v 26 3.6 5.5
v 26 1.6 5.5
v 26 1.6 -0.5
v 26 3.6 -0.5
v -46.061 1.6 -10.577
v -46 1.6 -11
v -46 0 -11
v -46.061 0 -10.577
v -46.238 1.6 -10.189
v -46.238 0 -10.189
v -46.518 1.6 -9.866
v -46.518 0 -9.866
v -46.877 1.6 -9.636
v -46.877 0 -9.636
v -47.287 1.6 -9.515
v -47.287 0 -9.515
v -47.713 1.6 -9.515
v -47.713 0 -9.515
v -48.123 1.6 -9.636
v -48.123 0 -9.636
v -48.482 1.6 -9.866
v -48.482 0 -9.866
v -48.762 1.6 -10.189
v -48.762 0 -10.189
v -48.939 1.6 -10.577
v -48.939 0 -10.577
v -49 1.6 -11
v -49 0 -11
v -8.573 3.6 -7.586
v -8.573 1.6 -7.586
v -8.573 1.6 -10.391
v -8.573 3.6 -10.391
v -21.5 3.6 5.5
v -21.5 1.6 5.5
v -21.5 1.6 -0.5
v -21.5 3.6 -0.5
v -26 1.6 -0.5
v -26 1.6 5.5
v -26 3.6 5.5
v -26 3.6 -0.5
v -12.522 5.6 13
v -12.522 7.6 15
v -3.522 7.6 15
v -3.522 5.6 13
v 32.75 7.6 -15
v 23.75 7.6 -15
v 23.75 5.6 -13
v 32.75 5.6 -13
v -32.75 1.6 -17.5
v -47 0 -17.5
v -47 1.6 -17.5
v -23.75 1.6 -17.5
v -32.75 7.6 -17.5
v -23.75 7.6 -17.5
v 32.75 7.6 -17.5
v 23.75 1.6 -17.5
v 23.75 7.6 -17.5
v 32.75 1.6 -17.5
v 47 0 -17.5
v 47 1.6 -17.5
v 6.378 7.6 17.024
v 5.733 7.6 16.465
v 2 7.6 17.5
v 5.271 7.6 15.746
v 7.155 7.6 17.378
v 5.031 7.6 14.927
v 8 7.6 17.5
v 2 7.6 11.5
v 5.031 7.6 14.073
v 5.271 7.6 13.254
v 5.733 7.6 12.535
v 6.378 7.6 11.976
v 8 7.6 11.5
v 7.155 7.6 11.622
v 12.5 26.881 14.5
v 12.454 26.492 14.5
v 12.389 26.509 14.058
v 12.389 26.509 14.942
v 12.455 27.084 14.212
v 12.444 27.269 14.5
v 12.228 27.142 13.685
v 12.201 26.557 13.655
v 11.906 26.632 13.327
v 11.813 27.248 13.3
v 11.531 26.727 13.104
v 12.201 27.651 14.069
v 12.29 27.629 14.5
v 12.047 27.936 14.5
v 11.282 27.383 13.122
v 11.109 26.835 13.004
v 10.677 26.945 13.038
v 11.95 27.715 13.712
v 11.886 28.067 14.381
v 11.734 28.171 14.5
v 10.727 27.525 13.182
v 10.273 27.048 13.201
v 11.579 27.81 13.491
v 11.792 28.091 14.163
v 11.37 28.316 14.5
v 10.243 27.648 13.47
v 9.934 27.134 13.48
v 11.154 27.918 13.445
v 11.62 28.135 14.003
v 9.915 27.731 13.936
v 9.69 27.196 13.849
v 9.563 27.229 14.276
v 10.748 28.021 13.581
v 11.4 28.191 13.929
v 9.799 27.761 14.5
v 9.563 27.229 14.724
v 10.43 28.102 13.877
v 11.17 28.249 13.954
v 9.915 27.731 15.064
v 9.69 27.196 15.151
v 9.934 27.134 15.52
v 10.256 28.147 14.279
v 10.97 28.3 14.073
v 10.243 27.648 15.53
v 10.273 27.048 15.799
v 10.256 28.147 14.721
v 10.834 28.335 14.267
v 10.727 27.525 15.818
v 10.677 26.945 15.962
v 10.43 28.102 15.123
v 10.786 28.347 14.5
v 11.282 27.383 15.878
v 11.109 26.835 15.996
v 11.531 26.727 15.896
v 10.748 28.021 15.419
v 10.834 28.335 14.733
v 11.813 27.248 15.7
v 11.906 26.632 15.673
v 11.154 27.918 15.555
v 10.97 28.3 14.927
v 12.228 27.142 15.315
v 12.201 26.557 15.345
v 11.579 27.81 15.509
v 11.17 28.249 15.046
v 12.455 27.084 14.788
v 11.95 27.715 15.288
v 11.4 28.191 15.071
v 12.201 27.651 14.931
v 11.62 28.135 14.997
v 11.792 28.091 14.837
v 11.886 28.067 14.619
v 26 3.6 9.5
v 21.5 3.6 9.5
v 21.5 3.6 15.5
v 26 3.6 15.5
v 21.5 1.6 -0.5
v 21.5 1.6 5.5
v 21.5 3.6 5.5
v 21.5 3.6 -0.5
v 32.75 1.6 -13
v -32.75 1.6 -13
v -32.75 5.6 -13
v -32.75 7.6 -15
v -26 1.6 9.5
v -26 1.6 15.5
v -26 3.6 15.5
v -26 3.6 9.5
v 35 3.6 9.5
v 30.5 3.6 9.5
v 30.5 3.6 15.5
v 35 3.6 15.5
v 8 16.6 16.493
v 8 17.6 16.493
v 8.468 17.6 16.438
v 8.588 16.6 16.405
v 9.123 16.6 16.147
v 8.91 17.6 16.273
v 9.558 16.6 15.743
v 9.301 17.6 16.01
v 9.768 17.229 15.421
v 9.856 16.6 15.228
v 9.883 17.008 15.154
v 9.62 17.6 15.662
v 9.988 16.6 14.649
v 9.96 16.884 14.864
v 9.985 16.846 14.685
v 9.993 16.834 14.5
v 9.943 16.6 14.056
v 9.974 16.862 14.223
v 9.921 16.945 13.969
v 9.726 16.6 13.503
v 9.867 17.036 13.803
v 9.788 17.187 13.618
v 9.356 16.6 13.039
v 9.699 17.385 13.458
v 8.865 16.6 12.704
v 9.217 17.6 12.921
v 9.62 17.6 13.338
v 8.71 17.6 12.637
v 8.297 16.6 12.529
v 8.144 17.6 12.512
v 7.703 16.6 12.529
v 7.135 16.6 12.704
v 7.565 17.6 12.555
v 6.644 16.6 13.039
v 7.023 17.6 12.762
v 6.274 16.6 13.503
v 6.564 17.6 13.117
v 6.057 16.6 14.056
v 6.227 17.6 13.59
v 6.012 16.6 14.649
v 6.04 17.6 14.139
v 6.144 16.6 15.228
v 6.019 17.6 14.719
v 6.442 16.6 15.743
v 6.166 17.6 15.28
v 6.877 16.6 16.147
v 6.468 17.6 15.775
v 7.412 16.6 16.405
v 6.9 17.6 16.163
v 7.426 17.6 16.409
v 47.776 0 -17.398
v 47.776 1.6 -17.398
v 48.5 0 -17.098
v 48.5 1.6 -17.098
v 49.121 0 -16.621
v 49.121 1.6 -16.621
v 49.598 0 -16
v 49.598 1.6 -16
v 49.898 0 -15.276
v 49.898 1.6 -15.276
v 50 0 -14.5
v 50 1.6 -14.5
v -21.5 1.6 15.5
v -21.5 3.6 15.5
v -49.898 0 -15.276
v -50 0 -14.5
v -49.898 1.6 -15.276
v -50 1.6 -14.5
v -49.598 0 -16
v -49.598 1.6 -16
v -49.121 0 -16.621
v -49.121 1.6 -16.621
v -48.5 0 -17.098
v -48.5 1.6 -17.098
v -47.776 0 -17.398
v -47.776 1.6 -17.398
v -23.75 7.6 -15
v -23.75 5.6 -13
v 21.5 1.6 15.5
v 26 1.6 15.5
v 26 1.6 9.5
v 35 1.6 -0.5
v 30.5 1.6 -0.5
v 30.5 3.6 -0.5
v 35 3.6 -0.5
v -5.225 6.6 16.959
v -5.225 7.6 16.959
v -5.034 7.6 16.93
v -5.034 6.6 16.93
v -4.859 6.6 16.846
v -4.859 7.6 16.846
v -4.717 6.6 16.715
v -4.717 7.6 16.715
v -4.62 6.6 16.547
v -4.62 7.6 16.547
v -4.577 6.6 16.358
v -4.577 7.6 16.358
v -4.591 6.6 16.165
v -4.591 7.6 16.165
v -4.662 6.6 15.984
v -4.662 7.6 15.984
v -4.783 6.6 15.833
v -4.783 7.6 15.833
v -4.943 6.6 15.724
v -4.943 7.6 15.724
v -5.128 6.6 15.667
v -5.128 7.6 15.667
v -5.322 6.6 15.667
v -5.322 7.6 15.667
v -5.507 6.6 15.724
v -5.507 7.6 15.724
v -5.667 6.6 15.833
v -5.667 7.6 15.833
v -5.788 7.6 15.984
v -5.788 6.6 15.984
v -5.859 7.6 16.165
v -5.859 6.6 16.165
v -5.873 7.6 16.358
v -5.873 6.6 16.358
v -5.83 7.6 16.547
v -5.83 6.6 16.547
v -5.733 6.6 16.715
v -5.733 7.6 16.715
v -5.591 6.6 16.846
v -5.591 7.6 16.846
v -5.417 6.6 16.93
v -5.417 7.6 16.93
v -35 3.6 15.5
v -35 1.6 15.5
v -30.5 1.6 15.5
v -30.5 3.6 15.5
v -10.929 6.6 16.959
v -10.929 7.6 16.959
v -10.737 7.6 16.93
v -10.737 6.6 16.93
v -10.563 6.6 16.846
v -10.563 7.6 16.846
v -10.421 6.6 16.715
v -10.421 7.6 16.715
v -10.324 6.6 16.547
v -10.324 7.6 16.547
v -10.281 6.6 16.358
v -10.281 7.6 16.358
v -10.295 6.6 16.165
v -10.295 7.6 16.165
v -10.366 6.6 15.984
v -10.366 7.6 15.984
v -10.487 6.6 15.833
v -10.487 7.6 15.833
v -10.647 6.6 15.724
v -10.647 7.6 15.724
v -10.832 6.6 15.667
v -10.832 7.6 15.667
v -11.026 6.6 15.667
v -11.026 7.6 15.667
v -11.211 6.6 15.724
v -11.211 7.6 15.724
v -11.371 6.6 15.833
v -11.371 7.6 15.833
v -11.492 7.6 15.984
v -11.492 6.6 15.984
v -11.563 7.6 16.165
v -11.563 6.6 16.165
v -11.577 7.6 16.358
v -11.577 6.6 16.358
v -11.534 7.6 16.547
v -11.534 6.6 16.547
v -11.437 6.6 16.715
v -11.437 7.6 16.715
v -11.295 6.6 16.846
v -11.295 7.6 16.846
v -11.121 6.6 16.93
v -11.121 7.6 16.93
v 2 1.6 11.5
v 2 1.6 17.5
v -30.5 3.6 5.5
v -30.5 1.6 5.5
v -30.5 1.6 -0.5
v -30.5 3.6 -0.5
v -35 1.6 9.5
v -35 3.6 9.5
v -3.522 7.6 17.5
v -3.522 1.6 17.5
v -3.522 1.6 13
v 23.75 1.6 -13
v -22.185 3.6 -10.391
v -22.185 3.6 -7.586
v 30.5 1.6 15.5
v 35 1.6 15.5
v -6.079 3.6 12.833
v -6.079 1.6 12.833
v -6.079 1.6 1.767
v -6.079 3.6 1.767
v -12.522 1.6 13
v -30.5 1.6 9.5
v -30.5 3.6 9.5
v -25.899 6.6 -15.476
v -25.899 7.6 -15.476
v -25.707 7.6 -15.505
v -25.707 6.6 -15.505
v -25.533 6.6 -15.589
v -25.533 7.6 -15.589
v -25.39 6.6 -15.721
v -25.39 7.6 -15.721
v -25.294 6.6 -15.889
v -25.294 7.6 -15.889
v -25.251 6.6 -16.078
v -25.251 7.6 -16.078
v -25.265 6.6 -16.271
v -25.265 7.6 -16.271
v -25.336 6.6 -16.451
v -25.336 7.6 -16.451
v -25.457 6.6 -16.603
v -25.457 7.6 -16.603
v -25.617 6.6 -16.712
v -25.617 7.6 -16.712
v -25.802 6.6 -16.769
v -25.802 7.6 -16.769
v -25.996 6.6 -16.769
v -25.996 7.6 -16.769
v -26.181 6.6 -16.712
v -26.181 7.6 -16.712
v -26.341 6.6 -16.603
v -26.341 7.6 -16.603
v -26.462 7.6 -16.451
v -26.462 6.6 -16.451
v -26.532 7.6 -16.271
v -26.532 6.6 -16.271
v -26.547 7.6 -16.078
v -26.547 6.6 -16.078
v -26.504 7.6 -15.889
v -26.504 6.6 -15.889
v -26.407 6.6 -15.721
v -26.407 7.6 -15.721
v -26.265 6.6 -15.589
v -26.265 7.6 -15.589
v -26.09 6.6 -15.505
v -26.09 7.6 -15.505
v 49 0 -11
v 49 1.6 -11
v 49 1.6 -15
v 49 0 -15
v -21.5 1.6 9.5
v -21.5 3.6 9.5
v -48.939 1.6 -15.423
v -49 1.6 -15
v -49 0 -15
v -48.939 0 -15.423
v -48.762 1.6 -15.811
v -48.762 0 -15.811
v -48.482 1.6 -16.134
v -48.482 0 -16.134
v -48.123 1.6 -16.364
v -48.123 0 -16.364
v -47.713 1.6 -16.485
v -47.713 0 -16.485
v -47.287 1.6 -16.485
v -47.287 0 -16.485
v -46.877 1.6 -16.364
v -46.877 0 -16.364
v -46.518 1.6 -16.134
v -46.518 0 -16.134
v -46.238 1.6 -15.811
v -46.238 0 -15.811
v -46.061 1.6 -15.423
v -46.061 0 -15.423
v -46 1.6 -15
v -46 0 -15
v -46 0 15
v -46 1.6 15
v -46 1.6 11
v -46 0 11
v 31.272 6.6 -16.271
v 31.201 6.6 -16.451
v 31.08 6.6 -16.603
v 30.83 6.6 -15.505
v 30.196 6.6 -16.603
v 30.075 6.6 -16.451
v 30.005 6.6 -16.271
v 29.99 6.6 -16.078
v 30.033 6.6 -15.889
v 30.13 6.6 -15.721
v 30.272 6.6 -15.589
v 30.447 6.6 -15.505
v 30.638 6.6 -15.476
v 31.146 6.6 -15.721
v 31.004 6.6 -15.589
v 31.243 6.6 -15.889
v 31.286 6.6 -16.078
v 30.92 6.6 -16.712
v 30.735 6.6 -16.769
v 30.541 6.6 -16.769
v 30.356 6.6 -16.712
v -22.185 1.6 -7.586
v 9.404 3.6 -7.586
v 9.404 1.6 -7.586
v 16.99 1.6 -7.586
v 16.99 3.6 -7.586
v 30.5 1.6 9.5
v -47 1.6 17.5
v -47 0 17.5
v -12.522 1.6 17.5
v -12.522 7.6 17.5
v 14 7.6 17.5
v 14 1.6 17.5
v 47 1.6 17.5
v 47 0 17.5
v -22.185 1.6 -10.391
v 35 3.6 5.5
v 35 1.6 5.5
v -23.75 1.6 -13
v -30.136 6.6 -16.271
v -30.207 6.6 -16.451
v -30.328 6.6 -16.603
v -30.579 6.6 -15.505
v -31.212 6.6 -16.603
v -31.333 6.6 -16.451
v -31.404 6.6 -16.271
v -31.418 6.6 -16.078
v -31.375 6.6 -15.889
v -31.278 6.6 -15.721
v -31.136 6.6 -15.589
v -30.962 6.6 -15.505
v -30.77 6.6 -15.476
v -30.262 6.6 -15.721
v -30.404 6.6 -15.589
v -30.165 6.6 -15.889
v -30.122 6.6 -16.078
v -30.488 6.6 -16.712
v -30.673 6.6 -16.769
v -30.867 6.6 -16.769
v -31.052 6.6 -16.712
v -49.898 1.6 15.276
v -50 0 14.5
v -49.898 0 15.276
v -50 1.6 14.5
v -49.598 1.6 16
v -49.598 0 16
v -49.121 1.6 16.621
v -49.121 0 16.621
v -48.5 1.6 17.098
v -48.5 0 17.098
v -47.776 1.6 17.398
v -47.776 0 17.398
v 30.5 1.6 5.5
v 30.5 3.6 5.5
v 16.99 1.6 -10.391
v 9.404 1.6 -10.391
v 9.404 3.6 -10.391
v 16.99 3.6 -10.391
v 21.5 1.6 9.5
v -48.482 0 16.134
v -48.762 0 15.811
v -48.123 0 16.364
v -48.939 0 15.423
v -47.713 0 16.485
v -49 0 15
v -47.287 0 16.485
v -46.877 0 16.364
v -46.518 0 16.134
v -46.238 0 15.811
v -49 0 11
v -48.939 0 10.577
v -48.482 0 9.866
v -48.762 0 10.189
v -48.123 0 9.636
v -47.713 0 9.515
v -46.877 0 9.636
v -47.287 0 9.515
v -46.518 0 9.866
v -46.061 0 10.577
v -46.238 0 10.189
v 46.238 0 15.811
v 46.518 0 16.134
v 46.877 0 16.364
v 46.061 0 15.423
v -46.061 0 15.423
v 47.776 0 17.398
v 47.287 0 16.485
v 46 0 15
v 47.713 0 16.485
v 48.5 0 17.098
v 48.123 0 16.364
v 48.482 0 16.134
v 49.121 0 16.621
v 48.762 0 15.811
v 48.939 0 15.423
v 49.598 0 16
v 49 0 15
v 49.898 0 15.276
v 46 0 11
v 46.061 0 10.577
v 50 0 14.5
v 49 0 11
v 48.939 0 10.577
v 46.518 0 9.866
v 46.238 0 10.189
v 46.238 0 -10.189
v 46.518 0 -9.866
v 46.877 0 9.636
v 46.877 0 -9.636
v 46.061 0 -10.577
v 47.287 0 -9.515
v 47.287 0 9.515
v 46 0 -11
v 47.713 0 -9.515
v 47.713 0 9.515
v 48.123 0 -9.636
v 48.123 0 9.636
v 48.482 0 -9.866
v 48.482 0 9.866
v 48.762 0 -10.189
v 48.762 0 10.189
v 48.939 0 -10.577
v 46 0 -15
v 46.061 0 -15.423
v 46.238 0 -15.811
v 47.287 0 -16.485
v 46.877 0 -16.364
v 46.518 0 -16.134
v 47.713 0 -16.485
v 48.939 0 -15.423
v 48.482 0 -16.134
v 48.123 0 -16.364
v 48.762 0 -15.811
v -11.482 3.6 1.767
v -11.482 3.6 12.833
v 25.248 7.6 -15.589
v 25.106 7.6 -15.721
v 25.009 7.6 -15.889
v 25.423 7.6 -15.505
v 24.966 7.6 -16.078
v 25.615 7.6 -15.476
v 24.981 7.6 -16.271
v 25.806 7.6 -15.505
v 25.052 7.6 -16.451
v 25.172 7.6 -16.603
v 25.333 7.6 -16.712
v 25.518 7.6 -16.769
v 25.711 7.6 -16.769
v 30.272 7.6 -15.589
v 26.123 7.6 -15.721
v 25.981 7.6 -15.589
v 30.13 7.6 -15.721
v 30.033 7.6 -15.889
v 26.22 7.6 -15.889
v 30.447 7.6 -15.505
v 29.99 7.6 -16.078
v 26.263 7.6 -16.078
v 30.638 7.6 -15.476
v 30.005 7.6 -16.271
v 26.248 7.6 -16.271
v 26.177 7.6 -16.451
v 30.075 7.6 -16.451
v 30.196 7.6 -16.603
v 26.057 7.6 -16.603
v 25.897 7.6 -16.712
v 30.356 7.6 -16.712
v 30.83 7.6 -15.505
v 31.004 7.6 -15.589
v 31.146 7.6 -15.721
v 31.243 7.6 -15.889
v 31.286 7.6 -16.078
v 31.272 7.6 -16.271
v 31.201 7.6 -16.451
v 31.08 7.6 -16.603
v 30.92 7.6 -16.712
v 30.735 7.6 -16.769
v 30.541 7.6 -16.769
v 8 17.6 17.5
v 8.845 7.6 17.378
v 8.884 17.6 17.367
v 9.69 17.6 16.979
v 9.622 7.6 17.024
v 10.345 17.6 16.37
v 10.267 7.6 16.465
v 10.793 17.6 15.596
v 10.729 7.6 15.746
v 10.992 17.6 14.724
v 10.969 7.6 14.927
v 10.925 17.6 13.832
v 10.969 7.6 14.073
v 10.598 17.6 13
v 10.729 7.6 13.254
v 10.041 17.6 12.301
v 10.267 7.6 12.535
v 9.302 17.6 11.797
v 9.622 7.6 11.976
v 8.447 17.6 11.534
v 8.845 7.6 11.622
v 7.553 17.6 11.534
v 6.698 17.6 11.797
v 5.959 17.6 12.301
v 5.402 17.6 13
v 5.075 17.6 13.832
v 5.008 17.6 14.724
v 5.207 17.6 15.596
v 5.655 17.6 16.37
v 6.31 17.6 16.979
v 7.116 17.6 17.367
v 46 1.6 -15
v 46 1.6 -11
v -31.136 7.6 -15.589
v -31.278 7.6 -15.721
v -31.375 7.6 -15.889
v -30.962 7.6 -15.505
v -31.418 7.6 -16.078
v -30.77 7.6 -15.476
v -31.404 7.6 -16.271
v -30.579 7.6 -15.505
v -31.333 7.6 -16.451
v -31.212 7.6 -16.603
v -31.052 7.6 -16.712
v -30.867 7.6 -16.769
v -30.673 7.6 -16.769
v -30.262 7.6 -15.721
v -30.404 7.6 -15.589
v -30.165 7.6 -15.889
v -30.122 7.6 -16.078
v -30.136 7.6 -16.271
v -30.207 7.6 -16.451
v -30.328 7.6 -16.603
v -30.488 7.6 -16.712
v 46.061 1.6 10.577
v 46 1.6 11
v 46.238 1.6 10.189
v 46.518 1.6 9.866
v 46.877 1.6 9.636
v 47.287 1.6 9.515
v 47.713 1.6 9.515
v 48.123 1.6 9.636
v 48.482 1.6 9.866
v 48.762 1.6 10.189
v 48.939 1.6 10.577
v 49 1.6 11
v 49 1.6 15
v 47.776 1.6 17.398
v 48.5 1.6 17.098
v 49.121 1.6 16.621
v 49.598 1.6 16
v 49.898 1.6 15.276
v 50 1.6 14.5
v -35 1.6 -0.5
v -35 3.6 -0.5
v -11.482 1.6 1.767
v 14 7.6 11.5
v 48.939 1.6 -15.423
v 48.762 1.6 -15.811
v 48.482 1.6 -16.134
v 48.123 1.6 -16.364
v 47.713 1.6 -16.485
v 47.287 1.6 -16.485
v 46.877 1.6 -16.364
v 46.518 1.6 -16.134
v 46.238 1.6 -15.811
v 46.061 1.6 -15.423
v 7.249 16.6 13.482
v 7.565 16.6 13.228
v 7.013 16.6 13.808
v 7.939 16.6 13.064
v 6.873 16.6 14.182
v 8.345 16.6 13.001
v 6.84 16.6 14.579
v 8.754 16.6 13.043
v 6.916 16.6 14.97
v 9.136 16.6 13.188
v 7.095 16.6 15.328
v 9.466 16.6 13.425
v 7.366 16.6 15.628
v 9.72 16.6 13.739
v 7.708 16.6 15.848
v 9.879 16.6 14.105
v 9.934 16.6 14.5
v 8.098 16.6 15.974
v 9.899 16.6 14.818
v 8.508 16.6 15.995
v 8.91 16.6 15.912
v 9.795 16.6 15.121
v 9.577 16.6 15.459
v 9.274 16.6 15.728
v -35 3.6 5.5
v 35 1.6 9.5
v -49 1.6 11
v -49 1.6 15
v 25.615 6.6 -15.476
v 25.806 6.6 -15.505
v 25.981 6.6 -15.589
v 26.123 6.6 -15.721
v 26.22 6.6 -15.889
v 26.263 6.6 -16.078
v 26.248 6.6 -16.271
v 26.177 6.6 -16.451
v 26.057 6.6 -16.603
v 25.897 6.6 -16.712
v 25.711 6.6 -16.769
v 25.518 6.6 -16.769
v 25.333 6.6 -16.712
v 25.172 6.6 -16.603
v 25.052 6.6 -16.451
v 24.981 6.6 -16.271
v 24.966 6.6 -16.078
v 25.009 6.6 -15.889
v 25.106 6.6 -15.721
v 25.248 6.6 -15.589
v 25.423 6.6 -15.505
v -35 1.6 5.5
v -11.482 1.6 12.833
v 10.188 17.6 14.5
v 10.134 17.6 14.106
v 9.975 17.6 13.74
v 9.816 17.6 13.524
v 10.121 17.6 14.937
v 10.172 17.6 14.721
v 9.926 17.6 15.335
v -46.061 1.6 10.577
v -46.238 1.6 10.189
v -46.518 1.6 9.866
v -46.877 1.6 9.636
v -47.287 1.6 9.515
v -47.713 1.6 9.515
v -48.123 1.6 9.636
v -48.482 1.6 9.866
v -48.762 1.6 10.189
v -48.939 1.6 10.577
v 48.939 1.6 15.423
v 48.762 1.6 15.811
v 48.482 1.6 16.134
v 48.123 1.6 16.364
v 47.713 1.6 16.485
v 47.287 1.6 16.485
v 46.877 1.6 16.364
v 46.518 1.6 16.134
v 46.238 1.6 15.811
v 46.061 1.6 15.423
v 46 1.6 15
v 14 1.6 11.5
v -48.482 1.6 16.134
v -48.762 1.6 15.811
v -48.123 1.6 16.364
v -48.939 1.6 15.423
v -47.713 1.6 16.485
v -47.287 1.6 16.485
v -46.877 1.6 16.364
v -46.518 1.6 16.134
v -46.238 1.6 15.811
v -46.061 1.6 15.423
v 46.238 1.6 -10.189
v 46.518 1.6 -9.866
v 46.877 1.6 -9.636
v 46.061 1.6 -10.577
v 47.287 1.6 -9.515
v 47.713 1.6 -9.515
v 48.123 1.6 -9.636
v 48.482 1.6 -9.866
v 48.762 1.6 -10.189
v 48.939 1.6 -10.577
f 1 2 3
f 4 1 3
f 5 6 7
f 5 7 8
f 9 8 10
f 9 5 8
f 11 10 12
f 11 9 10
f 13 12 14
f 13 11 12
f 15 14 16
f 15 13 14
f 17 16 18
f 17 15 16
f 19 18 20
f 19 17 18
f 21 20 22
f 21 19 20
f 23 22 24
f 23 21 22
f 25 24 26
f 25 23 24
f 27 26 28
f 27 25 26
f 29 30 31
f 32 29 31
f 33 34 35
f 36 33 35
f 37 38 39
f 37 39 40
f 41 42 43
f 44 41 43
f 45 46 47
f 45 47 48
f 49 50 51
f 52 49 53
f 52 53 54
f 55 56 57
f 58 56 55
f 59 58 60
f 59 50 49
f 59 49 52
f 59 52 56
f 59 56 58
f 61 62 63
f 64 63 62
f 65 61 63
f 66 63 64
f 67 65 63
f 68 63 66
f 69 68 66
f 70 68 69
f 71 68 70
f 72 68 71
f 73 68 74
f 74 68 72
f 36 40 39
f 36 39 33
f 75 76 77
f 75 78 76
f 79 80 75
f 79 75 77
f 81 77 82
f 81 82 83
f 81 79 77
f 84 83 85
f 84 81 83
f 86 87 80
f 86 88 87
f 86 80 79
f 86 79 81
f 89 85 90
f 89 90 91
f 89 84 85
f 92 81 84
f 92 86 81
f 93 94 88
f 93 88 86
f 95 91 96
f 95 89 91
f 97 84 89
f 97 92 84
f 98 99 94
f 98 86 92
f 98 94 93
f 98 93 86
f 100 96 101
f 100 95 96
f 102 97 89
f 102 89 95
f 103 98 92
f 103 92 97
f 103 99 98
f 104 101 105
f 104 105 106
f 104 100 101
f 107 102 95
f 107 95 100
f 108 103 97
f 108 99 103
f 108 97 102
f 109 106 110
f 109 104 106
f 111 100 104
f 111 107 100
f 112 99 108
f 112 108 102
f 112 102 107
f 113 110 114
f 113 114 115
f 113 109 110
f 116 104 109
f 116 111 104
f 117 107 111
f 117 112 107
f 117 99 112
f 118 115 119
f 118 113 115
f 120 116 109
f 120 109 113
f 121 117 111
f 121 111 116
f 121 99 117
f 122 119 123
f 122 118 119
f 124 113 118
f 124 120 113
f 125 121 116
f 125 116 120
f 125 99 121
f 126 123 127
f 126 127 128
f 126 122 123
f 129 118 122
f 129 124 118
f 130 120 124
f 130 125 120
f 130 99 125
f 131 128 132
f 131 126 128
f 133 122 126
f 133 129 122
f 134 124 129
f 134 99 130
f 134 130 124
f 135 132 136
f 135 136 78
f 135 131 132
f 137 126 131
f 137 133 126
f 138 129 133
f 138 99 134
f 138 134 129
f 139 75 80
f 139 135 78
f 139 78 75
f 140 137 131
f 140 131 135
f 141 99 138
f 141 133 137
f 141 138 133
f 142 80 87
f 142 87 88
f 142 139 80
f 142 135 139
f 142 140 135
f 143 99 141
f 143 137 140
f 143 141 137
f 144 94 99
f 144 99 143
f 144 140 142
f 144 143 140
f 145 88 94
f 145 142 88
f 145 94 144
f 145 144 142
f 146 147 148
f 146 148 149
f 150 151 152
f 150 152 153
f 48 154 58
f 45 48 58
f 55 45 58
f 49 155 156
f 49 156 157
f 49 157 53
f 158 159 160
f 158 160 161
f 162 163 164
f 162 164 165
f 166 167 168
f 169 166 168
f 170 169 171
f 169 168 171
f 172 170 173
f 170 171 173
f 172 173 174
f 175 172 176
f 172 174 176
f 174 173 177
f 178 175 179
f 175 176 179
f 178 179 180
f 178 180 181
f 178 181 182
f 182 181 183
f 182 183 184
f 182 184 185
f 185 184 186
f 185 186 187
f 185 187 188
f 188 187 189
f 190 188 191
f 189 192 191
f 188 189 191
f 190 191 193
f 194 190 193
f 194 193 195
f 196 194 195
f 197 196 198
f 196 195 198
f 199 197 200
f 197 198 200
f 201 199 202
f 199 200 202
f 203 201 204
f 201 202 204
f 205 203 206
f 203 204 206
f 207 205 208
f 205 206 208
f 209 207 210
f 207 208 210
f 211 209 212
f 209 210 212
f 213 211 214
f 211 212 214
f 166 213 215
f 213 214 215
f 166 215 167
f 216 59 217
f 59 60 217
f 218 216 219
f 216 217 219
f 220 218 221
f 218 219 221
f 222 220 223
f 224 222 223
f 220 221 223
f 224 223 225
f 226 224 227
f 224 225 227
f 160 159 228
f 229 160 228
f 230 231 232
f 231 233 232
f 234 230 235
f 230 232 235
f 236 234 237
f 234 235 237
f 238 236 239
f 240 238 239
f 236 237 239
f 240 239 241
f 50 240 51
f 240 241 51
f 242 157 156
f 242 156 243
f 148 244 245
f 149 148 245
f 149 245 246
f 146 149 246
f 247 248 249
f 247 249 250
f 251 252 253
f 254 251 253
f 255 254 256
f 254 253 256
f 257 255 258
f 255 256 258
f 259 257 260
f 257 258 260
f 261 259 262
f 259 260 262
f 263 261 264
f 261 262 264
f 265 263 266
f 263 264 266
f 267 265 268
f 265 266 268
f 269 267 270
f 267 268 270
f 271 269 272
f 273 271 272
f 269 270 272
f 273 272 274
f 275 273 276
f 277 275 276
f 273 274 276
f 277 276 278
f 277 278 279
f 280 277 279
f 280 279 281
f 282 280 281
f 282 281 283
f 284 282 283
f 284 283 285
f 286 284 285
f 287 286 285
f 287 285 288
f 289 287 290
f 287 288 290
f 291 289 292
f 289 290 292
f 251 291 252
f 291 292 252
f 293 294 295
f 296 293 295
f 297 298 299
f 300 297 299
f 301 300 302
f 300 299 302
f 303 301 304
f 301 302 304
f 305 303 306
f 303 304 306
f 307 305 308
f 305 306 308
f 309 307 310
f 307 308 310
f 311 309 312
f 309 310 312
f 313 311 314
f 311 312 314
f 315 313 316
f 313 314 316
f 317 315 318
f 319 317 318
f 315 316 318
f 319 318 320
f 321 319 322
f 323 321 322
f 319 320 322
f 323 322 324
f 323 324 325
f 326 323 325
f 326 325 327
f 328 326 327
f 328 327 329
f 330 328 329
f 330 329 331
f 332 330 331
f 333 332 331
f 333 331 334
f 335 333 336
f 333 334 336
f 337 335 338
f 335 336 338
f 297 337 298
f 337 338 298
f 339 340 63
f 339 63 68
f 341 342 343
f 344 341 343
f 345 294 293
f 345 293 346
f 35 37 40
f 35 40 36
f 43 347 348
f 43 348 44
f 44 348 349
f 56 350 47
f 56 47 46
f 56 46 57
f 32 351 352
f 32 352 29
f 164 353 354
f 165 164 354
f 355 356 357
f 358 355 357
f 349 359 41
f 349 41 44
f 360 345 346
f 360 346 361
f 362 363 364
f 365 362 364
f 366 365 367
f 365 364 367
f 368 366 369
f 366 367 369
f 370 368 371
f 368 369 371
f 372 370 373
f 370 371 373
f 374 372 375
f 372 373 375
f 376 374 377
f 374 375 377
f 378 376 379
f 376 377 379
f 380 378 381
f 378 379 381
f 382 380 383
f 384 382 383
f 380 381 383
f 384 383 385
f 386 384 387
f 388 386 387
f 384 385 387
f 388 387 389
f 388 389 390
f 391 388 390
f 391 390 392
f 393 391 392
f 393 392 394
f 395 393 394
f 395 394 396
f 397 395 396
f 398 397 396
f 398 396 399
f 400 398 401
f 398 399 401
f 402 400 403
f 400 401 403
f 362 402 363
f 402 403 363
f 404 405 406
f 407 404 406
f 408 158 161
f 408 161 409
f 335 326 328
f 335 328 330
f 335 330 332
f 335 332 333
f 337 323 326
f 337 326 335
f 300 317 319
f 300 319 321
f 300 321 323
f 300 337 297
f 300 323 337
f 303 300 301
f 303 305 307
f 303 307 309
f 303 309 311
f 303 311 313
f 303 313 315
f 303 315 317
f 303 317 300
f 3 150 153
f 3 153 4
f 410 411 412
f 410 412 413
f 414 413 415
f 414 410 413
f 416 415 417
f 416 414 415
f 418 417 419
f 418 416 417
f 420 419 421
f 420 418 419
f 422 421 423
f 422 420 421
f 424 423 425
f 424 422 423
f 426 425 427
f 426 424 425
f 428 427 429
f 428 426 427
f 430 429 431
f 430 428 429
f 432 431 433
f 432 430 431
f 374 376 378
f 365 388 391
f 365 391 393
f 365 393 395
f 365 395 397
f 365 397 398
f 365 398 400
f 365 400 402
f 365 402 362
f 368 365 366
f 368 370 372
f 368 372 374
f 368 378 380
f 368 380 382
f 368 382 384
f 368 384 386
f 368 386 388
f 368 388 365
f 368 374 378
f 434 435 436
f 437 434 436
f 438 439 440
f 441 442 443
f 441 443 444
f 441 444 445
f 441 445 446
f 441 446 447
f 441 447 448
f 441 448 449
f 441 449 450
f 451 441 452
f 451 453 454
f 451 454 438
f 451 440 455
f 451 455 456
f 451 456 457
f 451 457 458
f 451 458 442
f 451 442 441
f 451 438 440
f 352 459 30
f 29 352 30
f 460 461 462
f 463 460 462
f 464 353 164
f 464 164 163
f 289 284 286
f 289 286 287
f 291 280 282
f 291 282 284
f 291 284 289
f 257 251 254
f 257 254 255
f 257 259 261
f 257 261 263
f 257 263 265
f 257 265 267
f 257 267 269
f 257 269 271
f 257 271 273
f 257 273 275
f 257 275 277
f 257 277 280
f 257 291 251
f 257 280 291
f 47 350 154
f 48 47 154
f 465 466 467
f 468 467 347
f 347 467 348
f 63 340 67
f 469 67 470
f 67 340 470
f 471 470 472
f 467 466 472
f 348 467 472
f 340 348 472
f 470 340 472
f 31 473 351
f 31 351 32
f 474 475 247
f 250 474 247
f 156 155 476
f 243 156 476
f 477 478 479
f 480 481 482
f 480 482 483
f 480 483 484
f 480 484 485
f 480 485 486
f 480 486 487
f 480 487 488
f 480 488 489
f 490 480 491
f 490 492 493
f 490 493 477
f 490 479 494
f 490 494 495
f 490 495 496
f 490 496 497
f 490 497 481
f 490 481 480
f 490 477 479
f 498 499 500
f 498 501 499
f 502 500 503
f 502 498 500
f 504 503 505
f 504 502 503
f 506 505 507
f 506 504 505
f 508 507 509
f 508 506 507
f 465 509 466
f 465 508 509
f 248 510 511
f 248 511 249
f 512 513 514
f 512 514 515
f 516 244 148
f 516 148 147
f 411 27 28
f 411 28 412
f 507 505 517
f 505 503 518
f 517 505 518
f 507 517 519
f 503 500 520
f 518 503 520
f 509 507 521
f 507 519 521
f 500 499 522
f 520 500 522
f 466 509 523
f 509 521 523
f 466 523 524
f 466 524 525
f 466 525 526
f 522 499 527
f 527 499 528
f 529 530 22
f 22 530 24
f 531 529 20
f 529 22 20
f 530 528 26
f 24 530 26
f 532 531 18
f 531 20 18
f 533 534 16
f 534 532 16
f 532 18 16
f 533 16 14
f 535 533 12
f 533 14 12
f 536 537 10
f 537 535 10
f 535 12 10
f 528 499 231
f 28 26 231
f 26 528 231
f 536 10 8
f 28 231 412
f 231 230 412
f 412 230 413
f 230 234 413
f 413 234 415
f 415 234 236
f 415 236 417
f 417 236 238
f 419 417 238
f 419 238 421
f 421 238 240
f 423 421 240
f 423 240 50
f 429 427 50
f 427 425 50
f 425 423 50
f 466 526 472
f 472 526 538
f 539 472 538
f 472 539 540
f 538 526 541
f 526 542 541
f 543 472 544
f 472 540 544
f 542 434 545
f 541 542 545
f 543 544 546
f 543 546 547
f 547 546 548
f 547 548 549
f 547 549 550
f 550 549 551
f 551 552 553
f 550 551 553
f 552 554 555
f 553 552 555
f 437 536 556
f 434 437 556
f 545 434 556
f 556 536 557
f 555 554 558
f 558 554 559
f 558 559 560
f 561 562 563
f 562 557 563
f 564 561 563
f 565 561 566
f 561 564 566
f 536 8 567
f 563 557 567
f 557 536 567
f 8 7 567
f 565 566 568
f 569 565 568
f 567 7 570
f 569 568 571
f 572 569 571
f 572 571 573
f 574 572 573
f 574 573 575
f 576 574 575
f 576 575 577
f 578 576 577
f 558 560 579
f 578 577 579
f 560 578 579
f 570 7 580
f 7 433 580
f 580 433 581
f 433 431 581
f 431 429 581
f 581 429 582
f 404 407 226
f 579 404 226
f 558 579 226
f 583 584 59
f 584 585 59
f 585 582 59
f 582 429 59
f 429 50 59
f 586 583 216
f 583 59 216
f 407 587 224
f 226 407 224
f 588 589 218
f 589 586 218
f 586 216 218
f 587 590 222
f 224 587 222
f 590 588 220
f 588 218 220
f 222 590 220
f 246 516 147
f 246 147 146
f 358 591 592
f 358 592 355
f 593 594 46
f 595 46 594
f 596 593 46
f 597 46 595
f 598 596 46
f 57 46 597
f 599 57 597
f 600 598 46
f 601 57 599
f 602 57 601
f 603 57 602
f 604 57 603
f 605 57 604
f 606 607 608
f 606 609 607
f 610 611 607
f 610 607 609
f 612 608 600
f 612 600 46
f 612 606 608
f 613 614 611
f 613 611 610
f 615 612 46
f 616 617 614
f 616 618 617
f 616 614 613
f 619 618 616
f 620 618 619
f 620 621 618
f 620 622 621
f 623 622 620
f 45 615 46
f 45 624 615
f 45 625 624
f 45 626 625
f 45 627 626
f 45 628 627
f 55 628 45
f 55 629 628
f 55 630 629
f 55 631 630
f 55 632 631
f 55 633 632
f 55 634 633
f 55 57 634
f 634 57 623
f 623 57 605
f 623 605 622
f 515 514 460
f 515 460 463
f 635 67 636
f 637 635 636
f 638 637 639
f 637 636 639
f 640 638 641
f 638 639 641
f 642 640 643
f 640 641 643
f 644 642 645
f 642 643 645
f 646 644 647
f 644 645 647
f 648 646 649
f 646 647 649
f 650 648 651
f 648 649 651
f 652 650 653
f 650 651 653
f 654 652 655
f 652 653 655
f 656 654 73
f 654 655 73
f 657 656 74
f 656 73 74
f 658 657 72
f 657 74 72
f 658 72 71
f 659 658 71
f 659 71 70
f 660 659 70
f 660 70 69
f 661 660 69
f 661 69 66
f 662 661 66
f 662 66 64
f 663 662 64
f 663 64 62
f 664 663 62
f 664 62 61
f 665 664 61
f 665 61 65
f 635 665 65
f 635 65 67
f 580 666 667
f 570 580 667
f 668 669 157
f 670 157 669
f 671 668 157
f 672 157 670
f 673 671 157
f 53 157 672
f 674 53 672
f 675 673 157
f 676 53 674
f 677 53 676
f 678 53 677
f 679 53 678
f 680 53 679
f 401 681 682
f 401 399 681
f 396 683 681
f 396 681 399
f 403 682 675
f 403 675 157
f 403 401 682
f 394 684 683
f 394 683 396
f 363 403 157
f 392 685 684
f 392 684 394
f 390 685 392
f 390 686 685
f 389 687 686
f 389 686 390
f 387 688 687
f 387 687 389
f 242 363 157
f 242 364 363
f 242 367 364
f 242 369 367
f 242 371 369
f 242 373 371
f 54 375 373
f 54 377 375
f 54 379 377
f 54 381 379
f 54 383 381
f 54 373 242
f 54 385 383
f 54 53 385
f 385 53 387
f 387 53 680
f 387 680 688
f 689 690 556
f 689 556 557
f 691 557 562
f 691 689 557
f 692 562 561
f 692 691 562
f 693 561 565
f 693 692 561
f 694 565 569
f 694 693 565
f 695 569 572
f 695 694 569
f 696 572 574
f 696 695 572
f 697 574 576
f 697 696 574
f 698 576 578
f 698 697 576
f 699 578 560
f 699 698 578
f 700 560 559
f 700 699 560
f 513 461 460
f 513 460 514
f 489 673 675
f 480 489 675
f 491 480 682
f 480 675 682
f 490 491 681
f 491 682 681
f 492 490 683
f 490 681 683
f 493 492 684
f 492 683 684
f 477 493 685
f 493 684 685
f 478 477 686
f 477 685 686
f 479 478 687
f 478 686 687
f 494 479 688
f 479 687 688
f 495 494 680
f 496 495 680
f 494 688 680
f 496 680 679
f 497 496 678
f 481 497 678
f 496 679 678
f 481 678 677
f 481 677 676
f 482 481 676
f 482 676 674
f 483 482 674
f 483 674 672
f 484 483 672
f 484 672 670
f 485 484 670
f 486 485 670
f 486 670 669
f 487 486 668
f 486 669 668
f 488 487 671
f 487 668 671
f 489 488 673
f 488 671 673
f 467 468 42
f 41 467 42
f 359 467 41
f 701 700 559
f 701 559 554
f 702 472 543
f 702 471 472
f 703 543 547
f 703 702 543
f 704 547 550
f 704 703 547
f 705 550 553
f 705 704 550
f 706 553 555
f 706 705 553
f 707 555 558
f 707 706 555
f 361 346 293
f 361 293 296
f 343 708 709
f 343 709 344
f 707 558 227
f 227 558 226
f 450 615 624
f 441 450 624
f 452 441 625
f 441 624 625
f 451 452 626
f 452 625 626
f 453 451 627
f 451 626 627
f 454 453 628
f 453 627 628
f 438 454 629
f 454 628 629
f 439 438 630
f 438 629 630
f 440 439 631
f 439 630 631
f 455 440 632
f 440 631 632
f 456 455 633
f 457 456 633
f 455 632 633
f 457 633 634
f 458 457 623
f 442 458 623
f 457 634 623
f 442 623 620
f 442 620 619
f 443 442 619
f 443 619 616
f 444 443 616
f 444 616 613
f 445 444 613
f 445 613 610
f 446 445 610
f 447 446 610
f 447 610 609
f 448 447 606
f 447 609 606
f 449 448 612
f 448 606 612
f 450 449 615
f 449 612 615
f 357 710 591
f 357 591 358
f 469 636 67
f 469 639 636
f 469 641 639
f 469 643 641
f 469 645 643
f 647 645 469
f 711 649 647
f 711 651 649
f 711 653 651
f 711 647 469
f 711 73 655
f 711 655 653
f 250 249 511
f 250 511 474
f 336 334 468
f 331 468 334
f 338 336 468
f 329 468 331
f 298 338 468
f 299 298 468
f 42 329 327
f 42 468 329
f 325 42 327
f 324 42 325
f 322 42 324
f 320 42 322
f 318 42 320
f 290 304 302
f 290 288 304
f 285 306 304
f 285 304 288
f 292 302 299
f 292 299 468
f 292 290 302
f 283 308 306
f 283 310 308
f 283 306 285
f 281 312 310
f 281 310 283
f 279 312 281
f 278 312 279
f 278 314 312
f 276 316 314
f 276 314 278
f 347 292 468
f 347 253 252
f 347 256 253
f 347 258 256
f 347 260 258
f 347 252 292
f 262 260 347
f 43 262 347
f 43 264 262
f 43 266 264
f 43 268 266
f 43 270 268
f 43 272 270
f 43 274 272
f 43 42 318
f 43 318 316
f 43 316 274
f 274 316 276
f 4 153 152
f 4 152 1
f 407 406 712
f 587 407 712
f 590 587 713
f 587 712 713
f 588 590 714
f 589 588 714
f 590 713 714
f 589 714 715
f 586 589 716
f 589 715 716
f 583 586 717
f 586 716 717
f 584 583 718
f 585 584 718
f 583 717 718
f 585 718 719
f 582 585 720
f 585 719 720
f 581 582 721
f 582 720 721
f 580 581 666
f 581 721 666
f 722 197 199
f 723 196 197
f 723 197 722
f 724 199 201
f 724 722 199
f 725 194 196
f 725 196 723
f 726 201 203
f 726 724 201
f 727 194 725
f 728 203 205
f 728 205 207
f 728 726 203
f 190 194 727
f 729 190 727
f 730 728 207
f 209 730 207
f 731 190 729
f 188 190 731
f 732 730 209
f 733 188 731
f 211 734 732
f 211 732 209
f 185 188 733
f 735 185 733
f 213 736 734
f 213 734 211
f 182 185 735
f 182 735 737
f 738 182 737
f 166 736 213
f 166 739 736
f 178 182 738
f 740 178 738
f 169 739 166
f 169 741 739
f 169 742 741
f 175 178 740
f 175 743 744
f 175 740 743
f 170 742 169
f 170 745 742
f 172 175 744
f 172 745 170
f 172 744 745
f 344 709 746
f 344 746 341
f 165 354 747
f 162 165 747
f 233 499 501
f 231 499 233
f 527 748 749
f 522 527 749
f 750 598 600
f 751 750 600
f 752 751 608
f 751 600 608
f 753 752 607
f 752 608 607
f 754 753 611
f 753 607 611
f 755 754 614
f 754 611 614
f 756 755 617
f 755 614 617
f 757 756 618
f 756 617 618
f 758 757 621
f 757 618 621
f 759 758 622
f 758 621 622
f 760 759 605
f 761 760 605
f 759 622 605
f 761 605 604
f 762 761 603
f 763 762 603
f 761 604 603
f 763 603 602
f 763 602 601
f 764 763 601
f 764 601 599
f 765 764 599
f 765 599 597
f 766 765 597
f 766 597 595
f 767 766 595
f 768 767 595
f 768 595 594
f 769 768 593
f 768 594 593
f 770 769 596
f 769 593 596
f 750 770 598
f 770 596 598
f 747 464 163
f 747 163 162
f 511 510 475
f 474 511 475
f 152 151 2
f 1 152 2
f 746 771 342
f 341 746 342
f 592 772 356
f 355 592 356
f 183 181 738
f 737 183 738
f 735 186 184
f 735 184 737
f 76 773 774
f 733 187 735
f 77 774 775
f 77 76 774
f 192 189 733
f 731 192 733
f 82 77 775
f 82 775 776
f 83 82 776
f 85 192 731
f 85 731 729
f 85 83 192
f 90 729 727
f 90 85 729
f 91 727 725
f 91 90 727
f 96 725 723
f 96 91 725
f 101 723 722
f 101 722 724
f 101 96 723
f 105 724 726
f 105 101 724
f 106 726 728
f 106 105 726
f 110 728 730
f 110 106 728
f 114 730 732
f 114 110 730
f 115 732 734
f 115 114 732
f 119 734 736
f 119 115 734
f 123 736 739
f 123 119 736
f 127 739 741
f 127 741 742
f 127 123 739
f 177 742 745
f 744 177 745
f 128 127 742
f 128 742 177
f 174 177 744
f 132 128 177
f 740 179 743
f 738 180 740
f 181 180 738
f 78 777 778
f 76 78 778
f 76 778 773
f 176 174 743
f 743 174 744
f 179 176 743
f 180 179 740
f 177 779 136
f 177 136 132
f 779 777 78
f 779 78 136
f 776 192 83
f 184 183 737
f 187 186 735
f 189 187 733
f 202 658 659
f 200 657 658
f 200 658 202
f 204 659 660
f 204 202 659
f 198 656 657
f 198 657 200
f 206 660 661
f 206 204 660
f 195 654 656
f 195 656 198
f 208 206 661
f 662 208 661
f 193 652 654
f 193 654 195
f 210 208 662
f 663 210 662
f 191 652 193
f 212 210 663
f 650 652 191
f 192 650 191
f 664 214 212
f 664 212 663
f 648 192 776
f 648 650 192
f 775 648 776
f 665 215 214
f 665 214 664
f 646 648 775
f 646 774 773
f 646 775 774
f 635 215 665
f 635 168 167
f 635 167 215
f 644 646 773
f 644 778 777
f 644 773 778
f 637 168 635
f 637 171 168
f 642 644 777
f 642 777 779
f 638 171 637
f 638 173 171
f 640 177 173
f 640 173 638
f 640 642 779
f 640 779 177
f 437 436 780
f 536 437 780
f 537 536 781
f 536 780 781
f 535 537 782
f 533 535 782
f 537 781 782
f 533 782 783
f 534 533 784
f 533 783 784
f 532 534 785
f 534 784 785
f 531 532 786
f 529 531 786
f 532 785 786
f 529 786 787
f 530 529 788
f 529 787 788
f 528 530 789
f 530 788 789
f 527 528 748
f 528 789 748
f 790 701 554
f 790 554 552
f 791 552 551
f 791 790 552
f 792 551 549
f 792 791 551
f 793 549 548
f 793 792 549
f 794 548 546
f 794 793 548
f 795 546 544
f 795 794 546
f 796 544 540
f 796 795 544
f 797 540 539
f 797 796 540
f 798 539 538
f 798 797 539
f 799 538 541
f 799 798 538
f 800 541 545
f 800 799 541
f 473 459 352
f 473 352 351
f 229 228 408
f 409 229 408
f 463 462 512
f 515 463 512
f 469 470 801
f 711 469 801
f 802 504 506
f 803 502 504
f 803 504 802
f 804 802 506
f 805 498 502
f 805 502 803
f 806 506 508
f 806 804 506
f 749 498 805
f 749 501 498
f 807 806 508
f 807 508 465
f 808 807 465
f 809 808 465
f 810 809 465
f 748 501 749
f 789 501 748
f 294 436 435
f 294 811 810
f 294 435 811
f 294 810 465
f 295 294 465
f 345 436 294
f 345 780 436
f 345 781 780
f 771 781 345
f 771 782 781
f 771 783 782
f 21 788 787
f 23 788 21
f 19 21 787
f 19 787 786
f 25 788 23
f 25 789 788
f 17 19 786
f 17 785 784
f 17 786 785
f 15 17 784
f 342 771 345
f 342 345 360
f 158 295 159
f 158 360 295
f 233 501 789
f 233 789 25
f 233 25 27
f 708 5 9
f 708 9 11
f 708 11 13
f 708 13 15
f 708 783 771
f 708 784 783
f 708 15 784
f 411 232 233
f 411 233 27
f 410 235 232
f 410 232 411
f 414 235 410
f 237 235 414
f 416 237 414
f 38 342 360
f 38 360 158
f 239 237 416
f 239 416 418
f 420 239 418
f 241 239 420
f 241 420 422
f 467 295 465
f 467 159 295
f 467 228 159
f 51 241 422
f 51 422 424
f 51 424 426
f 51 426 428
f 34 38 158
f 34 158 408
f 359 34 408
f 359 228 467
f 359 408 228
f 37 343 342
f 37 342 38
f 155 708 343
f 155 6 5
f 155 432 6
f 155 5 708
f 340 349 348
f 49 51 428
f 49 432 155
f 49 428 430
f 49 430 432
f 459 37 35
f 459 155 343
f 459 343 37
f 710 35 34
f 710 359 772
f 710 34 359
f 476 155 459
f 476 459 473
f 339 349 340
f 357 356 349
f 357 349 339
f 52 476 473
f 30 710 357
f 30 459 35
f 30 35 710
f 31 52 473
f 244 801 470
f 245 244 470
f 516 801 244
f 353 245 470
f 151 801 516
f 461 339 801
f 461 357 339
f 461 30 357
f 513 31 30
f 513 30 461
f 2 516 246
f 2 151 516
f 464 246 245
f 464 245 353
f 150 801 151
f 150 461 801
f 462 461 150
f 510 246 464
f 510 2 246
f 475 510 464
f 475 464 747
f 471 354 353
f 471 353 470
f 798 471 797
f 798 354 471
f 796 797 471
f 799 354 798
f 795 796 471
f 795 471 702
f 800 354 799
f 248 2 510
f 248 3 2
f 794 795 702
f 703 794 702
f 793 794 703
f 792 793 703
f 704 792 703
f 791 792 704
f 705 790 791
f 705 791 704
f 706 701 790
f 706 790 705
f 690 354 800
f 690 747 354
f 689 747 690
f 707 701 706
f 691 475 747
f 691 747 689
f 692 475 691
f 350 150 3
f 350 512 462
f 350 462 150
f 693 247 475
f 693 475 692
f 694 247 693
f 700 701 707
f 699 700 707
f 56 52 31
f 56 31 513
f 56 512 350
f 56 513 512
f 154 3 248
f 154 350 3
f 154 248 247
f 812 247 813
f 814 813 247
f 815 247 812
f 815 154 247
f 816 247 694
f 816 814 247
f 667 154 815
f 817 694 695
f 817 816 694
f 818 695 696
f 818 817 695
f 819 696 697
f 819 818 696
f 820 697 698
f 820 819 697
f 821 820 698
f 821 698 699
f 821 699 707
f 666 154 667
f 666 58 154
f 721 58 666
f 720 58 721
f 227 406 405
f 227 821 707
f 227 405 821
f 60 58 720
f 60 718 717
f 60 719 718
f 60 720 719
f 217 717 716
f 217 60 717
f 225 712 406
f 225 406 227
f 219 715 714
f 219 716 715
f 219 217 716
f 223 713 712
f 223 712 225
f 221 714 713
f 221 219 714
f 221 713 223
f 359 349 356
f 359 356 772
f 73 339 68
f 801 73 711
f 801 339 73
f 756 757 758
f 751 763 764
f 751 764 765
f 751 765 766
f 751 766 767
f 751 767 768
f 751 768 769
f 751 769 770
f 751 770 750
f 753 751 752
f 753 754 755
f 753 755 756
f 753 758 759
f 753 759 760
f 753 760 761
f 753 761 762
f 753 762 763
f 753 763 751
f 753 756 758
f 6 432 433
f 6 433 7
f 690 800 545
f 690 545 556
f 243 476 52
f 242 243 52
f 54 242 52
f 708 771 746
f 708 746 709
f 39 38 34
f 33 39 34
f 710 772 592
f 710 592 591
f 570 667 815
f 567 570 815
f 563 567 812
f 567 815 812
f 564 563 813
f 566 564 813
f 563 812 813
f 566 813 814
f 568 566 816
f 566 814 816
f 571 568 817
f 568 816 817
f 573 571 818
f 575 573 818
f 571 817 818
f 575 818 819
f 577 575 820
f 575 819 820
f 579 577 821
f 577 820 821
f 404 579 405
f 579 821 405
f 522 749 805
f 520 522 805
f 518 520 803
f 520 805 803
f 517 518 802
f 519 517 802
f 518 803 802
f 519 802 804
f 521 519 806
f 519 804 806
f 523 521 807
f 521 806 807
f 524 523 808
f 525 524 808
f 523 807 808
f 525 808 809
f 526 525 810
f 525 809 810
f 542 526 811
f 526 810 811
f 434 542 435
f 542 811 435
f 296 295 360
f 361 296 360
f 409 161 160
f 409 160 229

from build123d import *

# Parameters (mm, degrees)
SKETCH_1_W          = 100
SKETCH_1_H          = 35
EXTRUDE_1_DEPTH     = 1.6
CUT_EXTRUDE_1_DEPTH = 53.998207517
FILLET_1_R          = 3
SKETCH_3_W          = 12
SKETCH_3_H          = 6
EXTRUDE_2_DEPTH     = 6
SKETCH_4_R          = 3
EXTRUDE_3_DEPTH     = 10
SKETCH_5_W          = 4.5
SKETCH_5_H          = 6
SKETCH_5_W_2        = 5.403478788
SKETCH_5_H_2        = 11.06674021
EXTRUDE_4_DEPTH     = 2
SKETCH_6_W          = 7.585652914
SKETCH_6_H          = 2.805652448
SKETCH_6_W_2        = 13.612610022
EXTRUDE_5_DEPTH     = 2
SKETCH_7_W          = 9
SKETCH_7_H          = 4.5
EXTRUDE_6_DEPTH     = 6
CHAMFER_1_SIZE      = 2
SKETCH_9_R          = 0.65
CUT_EXTRUDE_2_DEPTH = 1
SWEEP_1_PROFILE_R   = 1.5
SKETCH_27_R         = 1.993301653
CUT_EXTRUDE_3_DEPTH = 1


with BuildPart() as part:
    # 草图1 → 凸台-拉伸1 (new body)
    with BuildSketch(Plane(origin=(0, 0, 0), x_dir=(1, 0, 0), z_dir=(0, 1, 0))):
        Rectangle(SKETCH_1_W, SKETCH_1_H)
    extrude(amount=EXTRUDE_1_DEPTH)

    # 草图2 → 切除-拉伸1 (cut, through all)
    with BuildSketch(Plane(origin=(0, 1.6, 0), x_dir=(1, 0, 0), z_dir=(0, 1, 0))):
        with BuildLine():
            Line((-49, 11), (-49, 15))
            ThreePointArc((-49, 15), (-47.5, 16.5), (-46, 15))
            Line((-46, 15), (-46, 11))
            ThreePointArc((-46, 11), (-47.5, 9.5), (-49, 11))
        make_face()
        with BuildLine():
            Line((49, 11), (49, 15))
            ThreePointArc((49, 15), (47.5, 16.5), (46, 15))
            Line((46, 15), (46, 11))
            ThreePointArc((46, 11), (47.5, 9.5), (49, 11))
        make_face()
        with BuildLine():
            Line((-49, -11), (-49, -15))
            ThreePointArc((-49, -15), (-47.5, -16.5), (-46, -15))
            Line((-46, -15), (-46, -11))
            ThreePointArc((-46, -11), (-47.5, -9.5), (-49, -11))
        make_face()
        with BuildLine():
            Line((49, -11), (49, -15))
            ThreePointArc((49, -15), (47.5, -16.5), (46, -15))
            Line((46, -15), (46, -11))
            ThreePointArc((46, -11), (47.5, -9.5), (49, -11))
        make_face()
    extrude(amount=-CUT_EXTRUDE_1_DEPTH, mode=Mode.SUBTRACT)

    # 圆角1
    fillet_1_edges = [part.edges().sort_by_distance(p)[0] for p in [
        (50, 0.8, 17.5),
        (-50, 0.8, 17.5),
        (-50, 0.8, -17.5),
        (50, 0.8, -17.5),
    ]]
    fillet(fillet_1_edges, radius=FILLET_1_R)

    # 草图3 → 凸台-拉伸2 (add)
    with BuildSketch(Plane(origin=(0, 1.6, 0), x_dir=(1, 0, 0), z_dir=(0, 1, 0))):
        with Locations((8, -14.5)):
            Rectangle(SKETCH_3_W, SKETCH_3_H)
    extrude(amount=EXTRUDE_2_DEPTH)

    # 草图4 → 凸台-拉伸3 (add)
    with BuildSketch(Plane(origin=(0, 7.6, 0), x_dir=(1, 0, 0), z_dir=(0, 1, 0))):
        with Locations(Location((8, -14.5, 0), (0, 0, 270))):
            Circle(SKETCH_4_R)
    extrude(amount=EXTRUDE_3_DEPTH)

    # 草图5 → 凸台-拉伸4 (add)
    with BuildSketch(Plane(origin=(0, 1.6, 0), x_dir=(1, 0, 0), z_dir=(0, 1, 0))):
        with Locations((-32.75, -2.5)):
            Rectangle(SKETCH_5_W, SKETCH_5_H)
        with Locations((-23.75, -2.5)):
            Rectangle(SKETCH_5_W, SKETCH_5_H)
        with Locations((-32.75, -12.5)):
            Rectangle(SKETCH_5_W, SKETCH_5_H)
        with Locations((-23.75, -12.5)):
            Rectangle(SKETCH_5_W, SKETCH_5_H)
        with Locations((-8.78065303, -7.299892016)):
            Rectangle(SKETCH_5_W_2, SKETCH_5_H_2)
        with Locations((23.75, -12.5)):
            Rectangle(SKETCH_5_W, SKETCH_5_H)
        with Locations((32.75, -12.5)):
            Rectangle(SKETCH_5_W, SKETCH_5_H)
        with Locations((32.75, -2.5)):
            Rectangle(SKETCH_5_W, SKETCH_5_H)
        with Locations((23.75, -2.5)):
            Rectangle(SKETCH_5_W, SKETCH_5_H)
    extrude(amount=EXTRUDE_4_DEPTH)

    # 草图6 → 凸台-拉伸5 (add)
    with BuildSketch(Plane(origin=(0, 1.6, 0), x_dir=(1, 0, 0), z_dir=(0, 1, 0))):
        with Locations((13.196957808, 8.988479137)):
            Rectangle(SKETCH_6_W, SKETCH_6_H)
        with Locations((-15.379131934, 8.988479137)):
            Rectangle(SKETCH_6_W_2, SKETCH_6_H)
    extrude(amount=EXTRUDE_5_DEPTH)

    # 草图7 → 凸台-拉伸6 (add)
    with BuildSketch(Plane(origin=(0, 1.6, 0), x_dir=(1, 0, 0), z_dir=(0, 1, 0))):
        with Locations((-28.25, 15.25)):
            Rectangle(SKETCH_7_W, SKETCH_7_H)
        with Locations((28.25, 15.25)):
            Rectangle(SKETCH_7_W, SKETCH_7_H)
        with Locations((-8.02152296, -15.25)):
            Rectangle(SKETCH_7_W, SKETCH_7_H)
    extrude(amount=EXTRUDE_6_DEPTH)

    # 倒角1
    chamfer_1_edges = [part.edges().sort_by_distance(p)[0] for p in [
        (-28.25, 7.6, -13),
        (28.25, 7.6, -13),
        (-8.02152296, 7.6, 13),
    ]]
    chamfer(chamfer_1_edges, length=CHAMFER_1_SIZE)

    # 草图9 → 切除-拉伸2 (cut)
    with BuildSketch(Plane(origin=(0, 7.6, 0), x_dir=(1, 0, 0), z_dir=(0, 1, 0))):
        with Locations(Location((-30.77012682, 16.126476079, 0), (0, 0, 270))):
            Circle(SKETCH_9_R)
        with Locations(Location((-25.898686841, 16.126476079, 0), (0, 0, 270))):
            Circle(SKETCH_9_R)
        with Locations(Location((25.614567714, 16.126476079, 0), (0, 0, 270))):
            Circle(SKETCH_9_R)
        with Locations(Location((30.638295355, 16.126476079, 0), (0, 0, 270))):
            Circle(SKETCH_9_R)
        with Locations(Location((-10.92906004, -16.309333864, 0), (0, 0, 270))):
            Circle(SKETCH_9_R)
        with Locations(Location((-5.225111254, -16.309333864, 0), (0, 0, 270))):
            Circle(SKETCH_9_R)
    extrude(amount=-CUT_EXTRUDE_2_DEPTH, mode=Mode.SUBTRACT)

    # 草图27 → 切除-拉伸3 (cut)
    with BuildSketch(Plane(origin=(0, 17.6, 0), x_dir=(1, 0, 0), z_dir=(0, 1, 0))):
        with Locations(Location((8, -14.5, 0), (0, 0, 270))):
            Circle(SKETCH_27_R)
    extrude(amount=-CUT_EXTRUDE_3_DEPTH, mode=Mode.SUBTRACT)


with BuildPart() as body_2:
    # 扫描1: sweep along a path in 草图10
    with BuildLine(Plane.XY.offset(14.5)) as sweep_1_path:
        Line((7.943335964, 14.862681463), (11, 26.862681463))
    # 扫描1 profile (on start of the path) → 扫描1 (sweep)
    with BuildSketch(Plane(origin=(7.943335964, 14.862681463, 14.5), x_dir=(0.9690562615876172, -0.24683995194828523, 0), z_dir=(0.24683995194828523, 0.9690562615876172, 0))):
        Circle(SWEEP_1_PROFILE_R)
    sweep(path=sweep_1_path.line)

    # 圆顶1: read off the stored shape, not the designer's step
    # 圆顶1 outline → 圆顶1 (revolve)
    with BuildSketch(Plane(origin=(3.904168632, -0.994477654, 14.5), x_dir=(0.9690562615876172, -0.2468399519482851, 0), z_dir=(0, 0, 1))):
        with BuildLine():
            Line((0, 28.746689146), (1.5, 28.746689145))
            ThreePointArc((1.5, 28.746689145), (1.060660172, 29.807349317), (0, 30.246689146))
            Line((0, 30.246689146), (0, 28.746689146))
        make_face()
    revolve(axis=Axis((3.904168632, -0.994477654, 14.5), (0.2468399519482851, 0.9690562615876172, 0)))


with BuildPart() as part_1:
    add(part.part)

    # 相交1: read off the stored shape, not the designer's step
    # 相交1: union body 2
    add(body_2.part)


solid = part_1.part
